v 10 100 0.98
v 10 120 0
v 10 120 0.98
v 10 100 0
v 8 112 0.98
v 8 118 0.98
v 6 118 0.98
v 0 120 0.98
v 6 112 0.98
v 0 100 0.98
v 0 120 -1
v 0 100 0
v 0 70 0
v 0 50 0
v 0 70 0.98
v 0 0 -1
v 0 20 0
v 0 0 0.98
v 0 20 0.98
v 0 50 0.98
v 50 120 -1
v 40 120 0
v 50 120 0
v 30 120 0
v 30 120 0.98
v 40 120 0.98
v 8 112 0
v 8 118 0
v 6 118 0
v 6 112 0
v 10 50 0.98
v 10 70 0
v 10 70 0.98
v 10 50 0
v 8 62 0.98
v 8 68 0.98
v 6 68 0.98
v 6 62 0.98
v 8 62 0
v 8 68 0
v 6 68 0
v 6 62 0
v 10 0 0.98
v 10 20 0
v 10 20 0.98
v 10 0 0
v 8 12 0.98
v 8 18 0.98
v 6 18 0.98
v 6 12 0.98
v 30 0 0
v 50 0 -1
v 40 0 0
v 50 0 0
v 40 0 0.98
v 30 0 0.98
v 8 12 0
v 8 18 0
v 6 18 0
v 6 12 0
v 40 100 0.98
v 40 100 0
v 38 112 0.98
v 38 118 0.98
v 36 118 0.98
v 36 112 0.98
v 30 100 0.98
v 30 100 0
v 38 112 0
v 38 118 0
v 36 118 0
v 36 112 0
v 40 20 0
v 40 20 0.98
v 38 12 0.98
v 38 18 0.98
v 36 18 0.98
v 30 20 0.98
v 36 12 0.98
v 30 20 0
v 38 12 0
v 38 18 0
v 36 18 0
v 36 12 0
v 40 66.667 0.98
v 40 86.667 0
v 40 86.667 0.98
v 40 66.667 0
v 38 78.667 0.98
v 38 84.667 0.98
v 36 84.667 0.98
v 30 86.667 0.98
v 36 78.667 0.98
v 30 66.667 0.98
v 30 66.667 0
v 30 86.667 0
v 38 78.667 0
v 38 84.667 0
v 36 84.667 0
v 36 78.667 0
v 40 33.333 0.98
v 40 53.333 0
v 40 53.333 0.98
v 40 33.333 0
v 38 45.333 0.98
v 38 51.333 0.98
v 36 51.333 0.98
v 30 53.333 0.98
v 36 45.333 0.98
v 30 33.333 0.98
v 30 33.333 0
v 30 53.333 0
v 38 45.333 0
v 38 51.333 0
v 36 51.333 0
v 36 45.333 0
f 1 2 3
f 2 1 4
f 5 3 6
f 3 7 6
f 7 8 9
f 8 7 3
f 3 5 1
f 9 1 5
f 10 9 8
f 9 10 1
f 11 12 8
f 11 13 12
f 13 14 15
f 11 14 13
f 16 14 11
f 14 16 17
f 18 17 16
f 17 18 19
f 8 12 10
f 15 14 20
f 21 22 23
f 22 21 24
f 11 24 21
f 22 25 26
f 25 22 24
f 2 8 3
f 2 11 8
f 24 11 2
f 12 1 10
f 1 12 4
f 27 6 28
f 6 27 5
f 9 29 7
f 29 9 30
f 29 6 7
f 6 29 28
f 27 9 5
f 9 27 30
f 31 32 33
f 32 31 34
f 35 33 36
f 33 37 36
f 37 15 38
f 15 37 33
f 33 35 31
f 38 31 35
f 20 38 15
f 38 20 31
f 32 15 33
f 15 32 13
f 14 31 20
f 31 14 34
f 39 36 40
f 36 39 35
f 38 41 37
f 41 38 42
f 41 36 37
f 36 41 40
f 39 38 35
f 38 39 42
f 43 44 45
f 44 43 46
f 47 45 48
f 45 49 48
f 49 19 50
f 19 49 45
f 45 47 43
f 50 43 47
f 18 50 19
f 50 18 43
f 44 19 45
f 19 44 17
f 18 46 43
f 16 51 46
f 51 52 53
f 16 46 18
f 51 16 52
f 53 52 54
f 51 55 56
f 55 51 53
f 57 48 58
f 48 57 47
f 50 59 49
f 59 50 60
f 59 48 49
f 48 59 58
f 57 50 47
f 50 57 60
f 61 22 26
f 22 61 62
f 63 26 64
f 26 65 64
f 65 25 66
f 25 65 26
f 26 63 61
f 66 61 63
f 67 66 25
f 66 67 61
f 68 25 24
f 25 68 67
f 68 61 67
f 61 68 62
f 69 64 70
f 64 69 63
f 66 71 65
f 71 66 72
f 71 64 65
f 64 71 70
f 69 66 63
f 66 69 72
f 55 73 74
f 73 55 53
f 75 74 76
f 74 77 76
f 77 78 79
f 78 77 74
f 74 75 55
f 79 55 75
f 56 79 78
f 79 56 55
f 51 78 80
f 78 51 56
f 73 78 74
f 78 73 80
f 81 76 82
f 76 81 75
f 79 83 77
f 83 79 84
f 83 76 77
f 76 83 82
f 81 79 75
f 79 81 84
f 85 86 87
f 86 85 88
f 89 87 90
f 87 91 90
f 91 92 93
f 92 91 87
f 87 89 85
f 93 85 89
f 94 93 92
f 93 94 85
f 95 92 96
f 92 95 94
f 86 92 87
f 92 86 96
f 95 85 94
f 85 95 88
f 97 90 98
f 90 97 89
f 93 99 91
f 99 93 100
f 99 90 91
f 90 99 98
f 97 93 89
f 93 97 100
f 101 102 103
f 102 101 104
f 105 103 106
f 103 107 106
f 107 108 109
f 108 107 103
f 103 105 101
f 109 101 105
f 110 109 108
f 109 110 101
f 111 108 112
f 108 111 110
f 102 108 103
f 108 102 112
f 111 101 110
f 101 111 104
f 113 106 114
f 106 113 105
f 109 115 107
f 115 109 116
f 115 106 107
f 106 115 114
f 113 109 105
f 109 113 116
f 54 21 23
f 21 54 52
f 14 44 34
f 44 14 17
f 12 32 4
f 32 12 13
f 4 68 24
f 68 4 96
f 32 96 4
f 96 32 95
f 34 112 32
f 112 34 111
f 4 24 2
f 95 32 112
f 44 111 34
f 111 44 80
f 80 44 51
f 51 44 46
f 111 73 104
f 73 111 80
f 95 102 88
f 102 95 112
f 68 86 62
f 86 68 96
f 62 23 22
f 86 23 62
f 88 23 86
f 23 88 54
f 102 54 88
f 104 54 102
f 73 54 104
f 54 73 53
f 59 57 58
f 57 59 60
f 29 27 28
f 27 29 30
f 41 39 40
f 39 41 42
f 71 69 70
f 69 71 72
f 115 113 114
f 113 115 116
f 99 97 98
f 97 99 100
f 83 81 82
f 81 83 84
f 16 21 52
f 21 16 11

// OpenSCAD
// file: ../../Base/Boxes.scad
// Fischertechnik Box Foundation
// Pre-designed Boxes

use <Constants.scad>

include <PlacementOptions.scad>

box190Width = 190;
box190Depth = 130;
box130Width = 130;
box130Depth = 95;
boxUsageHeight = 33.9;
boxWallThickness = 2.4;
boxBaseThickness = 1.0;

// getBoxWallThickness()
// Gets the wall thickness of a Fischertechnik Box

function getBoxWallThickness() = boxWallThickness;

// Gets the usable height of a fischertechnik box
function getBoxUsageHeight() = boxUsageHeight;

// Gets the thickness of the Fischertechnik box base.
function getBoxBaseThickness() = boxBaseThickness;

// Gets the usable inner space of a Box 190 as an x/y-list
function getBox190Space() = [
    box190Width - 2*getBoxWallThickness(), 
    box190Depth - 2*getBoxWallThickness() ];

// Imports the Fischertechnik empty box 130x190 mm and places it at position 0,0
// 190x130 are the outer sizes, the inner space is slightly smaller. Use getBox190Space() to get the inner sizes.
// This module needs the STL file "Fischertechnik Box 130x190.stl" in the library path.
// The box is positioned that the usable inner space is at the 0,0,0 position. The

module Box190() {
    translate([-getBoxWallThickness(),-getBoxWallThickness(),-getBoxBaseThickness()])
        import("Fischertechnik Box 130x190.stl", convexity=3);
}

// Gets the usable inner space of a Box 130 as an x/y-list
function getBox130Space() = [
    box130Width - 2*getBoxWallThickness(), 
    box130Depth - 2*getBoxWallThickness() ];

// Imports the Fischertechnik empty box 95x130 mm and places it at position 0,0
// 190x130 are the outer sizes, the inner space is slightly smaller. Use getBox190Space() to get the inner sizes.
// This module needs the STL file "Fischertechnik Box 95x130.stl" in the library path.
// The box is positioned that the usable inner space is at the 0,0,0 position. The

module Box130() {
    translate([-getBoxWallThickness(),-getBoxWallThickness(),-getBoxBaseThickness()])
        import("Fischertechnik Box 95x130.stl", convexity=3);
}

// Creates a web at the specified box walls
// corner 0 = LowerLeft, 1 = UpperLeft, 2 = UpperRight, 3 = LowerRight
// side 0 = LeftOfCorner, 1 = RightOfCorner
// distance = Distance in mm from the corner
// box = inner width and depth of the box (default: Box 190)
// webWidth = length of the web (default is 3 mms)
// webThickness = thickness of the web (default is 1 mm)

module BoxWeb(corner, side, distance, box=getBox190Space(), webWidth=3, webThickness=1.0) {
    sink = getBoxWallThickness()/2;

    width = (corner % 2 == 0) ? 
            (side == LeftOfCorner ? webWidth : webThickness) :
            (side == LeftOfCorner ? webThickness : webWidth);

    depth = (corner % 2 == 0) ? 
            (side == RightOfCorner ? webWidth : webThickness) :
            (side == RightOfCorner ? webThickness : webWidth);
    
    xDiff = corner == LowerLeft ? 
                (side == LeftOfCorner ? -sink : distance) :
            (corner == UpperLeft ?                
                (side == LeftOfCorner ? distance : -sink) :
            (corner == UpperRight ?
                (side == LeftOfCorner ? box.x-webWidth+sink : box.x-distance-webThickness) :
                (side == LeftOfCorner ? box.x-distance-webThickness: box.x-webWidth+sink)));

    yDiff = corner == LowerLeft ? 
                (side == RightOfCorner ? -sink : distance) :
            (corner == UpperLeft ?
                (side == RightOfCorner ? box.y-distance : box.y-webWidth+sink) :
            (corner == UpperRight ?
                (side == RightOfCorner ? box.y-webWidth+sink : box.y-distance) :
                (side == RightOfCorner ? distance : -sink)));
    
    translate([xDiff, yDiff, -getExcess()])
        cube([width, depth, boxUsageHeight + 2*getExcess()]);
}
// file: ../../Base/Alignment.scad
// Fischertechnik Box Foundation
// Geometry Helpers Alignment

include <PlacementOptions.scad>

// getAlignedX(elementWidth, spaceWidth, align=AlignRight, offset=0)
// Gets the aligned X offset of an element with the given
// width in the given space.
// elementWidth = The width of the element to positon
// spaceWidth = The space where the element should be aligned
// align = 0 AlignLeft, 1 AlignCenter, 2 AlignRight
// offset = an optional offset from the aligned position. When
// aligned left or centered, then positive values are in X direction.
// When aligned right then positive values are in negative X direction.

function getAlignedX(elementWidth, spaceWidth, align=AlignRight, offset=0) =
    (align == AlignLeft) ?
        offset :
        ((align == AlignCenter) ?
        (spaceWidth - elementWidth)/2 + offset :
        spaceWidth - offset - elementWidth);

// getAlignedY(elementDepth, spaceDepth, align=AlignTop, offset=0)
// Gets the aligned Y offset of an element with the given
// depth in the given space.
// elementDepth = The depth of the element to positon
// spaceDepth = The space where the element should be aligned
// align = 0 AlignBottom, 1 AlignCenter, 2 AlignTop
// offset = an optional offset from the aligned position. When
// aligned bottom or centered, then positive values are in Y direction.
// When aligned top then positive values are in negative Y direction.

function getAlignedY(elementDepth, spaceDepth, align=AlignTop, offset=0) =
    (align == AlignBottom) ?
        offset :
        ((align == AlignCenter) ?
        (spaceDepth - elementDepth)/2 + offset :
        spaceDepth - offset - elementDepth);
// file: ../../Base/Rotation.scad
// Fischertechnik Box Foundation
// Geometry Helpers Rotation

include <PlacementOptions.scad>

// getRotatedSpace(space, rotation=NoRotation)
// Rotates the space dependent on the specified rotation

function getRotatedSpace(space, rotation=NoRotation) = [
    (rotation == Rotate90 || rotation == Rotate270) ? space.y : space.x,
    (rotation == Rotate90 || rotation == Rotate270) ? space.x : space.y
];

// Rotates the given space around the fixed left lower corner
// space = the space the children needs as width/depth list [width,depth]
// rotation = 0 Rotate0 degrees, 1 Rotate90 degrees, 2 Rotate180 degrees, 3 Rotate270 degrees (equivalent to -90)

module RotateFix(space, rotation=Rotate0) {
    dy = (rotation == Rotate0 || rotation == Rotate270) ? 0 :
        (rotation == Rotate90) ? space.x :
        space.y;
    dx = (rotation < Rotate180) ? 0 :
        (rotation == Rotate180) ? space.x :
        space.y;
    
    translate([dx, dy, 0])
        rotate([0, 0, rotations[rotation]])
            children();
}
// file: ../../Base/Constants.scad
// Fischertechnik Box Foundation
// Constants

// Constant values necessary for multiple elements

// Base constants
dividerThickness = 1.2;
excess = 0.01;
fragments = 90;
tolerance = 0.8;

// Gets the thickness of a divider 
function getDividerThickness() = dividerThickness;

// Gets the excess that is used to merge walls into each other
function getExcess() = excess;

// Gets amount of fragments of a cylinder
function getFragments() = fragments;

// Gets the inner tolerance of a frame to each side
function getTolerance() = tolerance;


// Fischertechnik specific constants
axisDiameter = 4;
axisBottomDiameter = axisDiameter + 1;
standardEdgeDistance = 2.5;
standardWebDistance = 11.5;
standardCornerLength = 15;
tubeWallFactor = 1.6;

// Gets axis diameter
function getAxisDiameter() = axisDiameter;

// Gets axis bottom diameter for thicker part at the bottom
function getAxisBottomDiameter() = axisBottomDiameter;

// gets the standard distance to the wall of the box for dockable frames with webs
function getStandardEdgeDistance() = standardEdgeDistance;

// gets the standard distance of each web to the corner of the dockable frame
function getStandardWebDistance() = standardWebDistance;

// gets the standard length of the corner walls of a dockable frame
function getStandardCornerLength() = standardCornerLength;

// gets the wall thickness of a tube.
function getTubeWallThickness() = tubeWallFactor * getDividerThickness();
// file: ../TestHelper.scad
// Fischertechnik Box Foundation
// Test Helper

function getPlacementBaseSpace() = [50,60];
function getCubeSpace() = [10,20];

module PlacementBase() {
    color("green")
    translate([0, 0, -1])
        cube([getPlacementBaseSpace().x, getPlacementBaseSpace().y, 1]);
}

module Cube() {
    translate([0,0,-.01])
    difference() {
        cube([getCubeSpace().x,getCubeSpace().y,1]);
        translate([getCubeSpace().x*0.6, getCubeSpace().y*0.6, -1])
            cube([getCubeSpace().x*0.2,getCubeSpace().y*0.3,3]);
    }
}

module Deploy(distance=30) {
    for( i = [0:1:$children-1])
        translate([i*distance, 0])
            children(i);
}
// file: ../../Base/PlacementOptions.scad
// Fischertechnik Box Foundation
// Placement Options

// Alignment
NoAlign = 0;
AlignLeft = 1;
AlignBottom = 2;
AlignCenter = 3;
AlignRight = 4;
AlignTop = 5;

// Element rotation degree steps
rotations = [0, -90, -180, -270];

// Rotation
NoRotation = 0;
Rotate0 = 0;
Rotate90 = 1;
Rotate180 = 2;
Rotate270 = 3;

// Docking (seen from above)
NoDock = -1;
DockLeft = 0;
DockTop = 1;
DockRight = 2;
DockCorner = 2;
DockBottom = 3;

// Web corners
LowerLeft = 0;
UpperLeft = 1;
UpperRight = 2;
LowerRight = 3;

// Web position relative to corner
LeftOfCorner = 0;
RightOfCorner = 1;
// file: ../../Base/Placement.scad
// Fischertechnik Box Foundation
// Geometry Helpers Placement

use <Constants.scad>
use <Alignment.scad>
use <Rotation.scad>
use <Boxes.scad>

include <PlacementOptions.scad>

// Place(x=0, y=0, elementSpace=[0,0], alignX=AlignLeft, alignY=AlignBottom, rotation=Rotate0, boxSpace=getBox190Space())
// Places the child at the specified position
// y = Y-Position. This is a relative position when an X aligment is specified.
// x = X-Position. This is a relative position when an Y aligment is specified.
// elementSpace = space of the element to be placed [x,y]
// alignX = -1=NoAlign, 0 AlignLeft, 1 AlignCenter, 3 AlignRight (elementSpace and boxSpace required!)
// alignY = -1=NoAlign, 2 AlignBottom, 1 AlignCenter, 4 AlignTop (elementSpace and boxSpace required!)
// rotation = 0 Rotate0 0 degrees, 1 Rotate90 90 degrees, 
// 2 Rotate180 180 degrees, 3 Rotate270 270 degrees (equivalent to -90)
// boxSpace = Inner space of the box where the placement occurs [x,y] - default is Box 190x130 inner space

module Place(x=0, y=0, elementSpace=[0,0], 
  alignX=AlignLeft, alignY=AlignBottom, 
  rotation=NoRotation, boxSpace=getBox190Space()) {

    module Position(x, y, space, rotation=Rotate0) {
        translate([x, y, 0])
            RotateFix(space, rotation)
                children(0);
    }

    space = getRotatedSpace(elementSpace, rotation);
    alignedX = getAlignedX(space.x, boxSpace.x, alignX, x);
    alignedY = getAlignedY(space.y, boxSpace.y, alignY, y);
    Position(alignedX, alignedY, elementSpace, rotation)
        children(0);
}

// Center(space=getBox130Space(), elementSpace=[0,0])
// space = Space where the children is centered. For cylinder use centered=true and no elementSpace.
// elementSpace = space of the element to be centered [x,y]

module Center(space=getBox190Space(), elementSpace=[0,0]) {
    translate([(space.x - elementSpace.x) / 2, (space.y - elementSpace.y) / 2])
        children(0);
}

// CenterHorizontal(width=0, y=0, offset=0, space=getBox130Space())
// space = Space where the children is centered. For cylinder use centered=true and no elementSpace.
// elementSpace = space of the element to be centered [x,y]

module CenterHorizontal(width=0, y=0, offset=0, space=getBox190Space()) {
    translate([(space.x - width) / 2 + offset, y])
        children(0);
}

// CenterVertical(depth=0, x=0, offset=0, space=getBox130Space())
// space = Space where the children is centered. For cylinder use centered=true and no elementSpace.
// elementSpace = space of the element to be centered [x,y]

module CenterVerticalal(depth=0, x=0, offset=0, space=getBox190Space()) {
    translate([x, (space.y - depth) / 2 + offset])
        children(0);
}
// file: ../../Base/Deployment.scad
// Fischertechnik Box Foundation
// Geometry Helpers Deployment

use <Constants.scad>
use <Placement.scad>
use <Rotation.scad>

include <PlacementOptions.scad>

// getWidth(spaces, rotations, count, i=0)
// Gets the sum of the width of count specified spaces, including rotations for each space.
// spaces = List of spaces from which the width should be added. Used internally for DeployRow.
// rotations = specify rotations for each space to get its correct width
// count = The count of spaces from the specified spaces that should be included in the sum (for recursive call)
// i = The space index offset used to start to add (for recursive call)

function getWidth(spaces, rotations, count, i=0) = 
    (i < count) ? 
        getRotatedSpace(spaces[i], rotations[i]).x + getWidth(spaces, rotations, count, i+1) : 
        0;

// getX(spaces, rotations, distance, i)
// Calculates the X position of the space with the index i, when the spaces are placed with the given
// equal distances. Used internally for DeployRow.
// spaces = List of spaces from which the width should be added
// rotations = specify rotations for each space to get its correct width
// distance = Equal distance between each space
// i = Index of the space to get its X position for

function getX(spaces, rotations, distance, i) = 
    (i == 0) ? 
        0 :
        (getRotatedSpace(spaces[i-1], rotations[i-1]).x + distance + getX(spaces, rotations, distance, i-1));

// DeployHorizontal(width, spaces, rotations)
// Deploys the elements in the specified width with equal distances.
// rowWidth = The width of the row in mm.
// spaces = The spaces of all elements to deploy.
// rotations = The rotations of each element: 0 Rotate0 0 degrees, 1 Rotate90 90 degrees, 
// 2 Rotate180 180 degrees, 3 Rotate270 270 degrees (equivalent to -90).

module DeployHorizontal(rowWidth, spaces, rotations) {
    distance = (rowWidth - getWidth(spaces, rotations, len(spaces))) / (len(spaces)-1);
    
    for (i = [0:1:$children-1]) {
        x = getX(spaces, rotations, distance, i);
        translate([x, 0])
            RotateFix(spaces[i], rotations[i])
                children(i);
    }
}

// getDepth(spaces)
// Gets the sum of the depth of count specified spaces.
// spaces = List of spaces from which the width should be added. Used internally for DeployRow.
// rotations = specify rotations for each space to get its correct width
// count = The count of spaces from the specified spaces that should be included in the sum
// i = The space index offset used to start to add

function getDepthSum(spaces, i=0) = 
    (i < len(spaces)) ? 
        spaces[i].y + getDepthSum(spaces, i+1) : 
        0;

// getY(spaces, distance, i)
// Gets the Y-distance the spaces plus constant distance 
// between each space needs.
// spaces = Spaces of each element to deploy vertically. Only
// the depth (y) is used.
// distance = distance between each space when deployed.
// i = The highest index of the spaces used

function getY(spaces, distance, i) = 
    (i == 0) ? 
        0 :
        spaces[i].y + distance + getY(spaces, distance, i-1);

// DeployVertical(depth, spaces)
// Deploys the child elements in the specified depth vertically.
// depth = Depth of the space where the elements should be deployed.
// spaces = Spaces of all elements. Only the depth (y) will be used.

module DeployVertical(depth, spaces) {
    distance = (depth - getDepthSum(spaces)) / (len(spaces)-1);
    count = $children - 1;
    
    for (i = [0:1:$children-1]) {
        y = getY(spaces, distance, count-i);
        translate([0, y, -getExcess()])
            children(i);
    }
}

// DeploySame(space, elementSpace, columns=2, rows=1, rotation=Rotate0)
// Deploys columns and rows of the specified child in the specified space with
// equal distances
// space = The space where the element copies are deployed
// elementSpace = The space the child needs
// columns = Count of elements per row
// rows = Count of rows deployed
// rotation = The rotation of the child that will be applied

module DeploySame(space, elementSpace, columns=2, rows=1, rotation=Rotate0) {
    
    elementWidth = getRotatedSpace(elementSpace, rotation).x;
    columnDistance = (space.x - columns * elementWidth) / (columns > 1 ? columns - 1 : 1);
    endColumnOffset = space.x - elementWidth;
    columnOffsetStep = elementWidth + columnDistance;
    
    elementDepth = getRotatedSpace(elementSpace, rotation).y;
    rowDistance = (space.y - rows * elementDepth) / (rows > 1 ? rows - 1 : 1);
    endRowOffset = space.y - elementDepth;
    rowOffsetStep = elementDepth + rowDistance;
    
    for (rowOffset = [0:rowOffsetStep:endRowOffset]) {
        for (columnOffset = [0:columnOffsetStep:endColumnOffset]) {
            translate([columnOffset, rowOffset])
                RotateFix(elementSpace, rotation)
                    children(0);
        }
    }
}

// getMergedRowWidth(spaces, rotations, count, i=0)
// Gets the width of the merged spaces with the specified rotations.
// Merging works all elements with two frame walls. 
// The right and left walls are merged into one single wall.
// spaces = List of spaces from which the width should be added.
// rotations = specify rotations for each space to get its correct width
// count = The count of spaces from the specified spaces that should be included in the sum (for recursive call)
// i = The space index offset used to start to add (for recursive call)

function getMergedRowWidth(spaces, rotations, count, i=0) =
    (i < count) ? 
        getRotatedSpace(spaces[i], rotations[i]).x + getWidth(spaces, rotations, count, i+1) - (i > 0 ? getDividerThickness() : 0) : 
        0;

// MergeRow(spaces, rotations, dividerThickness=0.8)
// Deploys the children so that all walls of the neighbors are merged in a single common wall.
// spaces = List of spaces of the children to get the sizes from.
// rotations = specify rotations for each space to get its correct width
// dividerThickness = Thickness of all dividers of the elements (default is 0.8)

module MergeRow(spaces, rotations, dividerThickness = getDividerThickness()) {
    for (i = [0:1:$children-1]) {
        x = getX(spaces, rotations, -getDividerThickness(), i);
        translate([x, 0, 0])
            RotateFix(spaces[i], rotations[i])
                children(i);
    }
}

// Merge(count, space, rotation, dividerThickness=0.8)
// Deploys the child count times so that all walls of the neighbors are merged in a single common wall.
// space = Space of the child to get the sizes from.
// rotation = rotation of the child to get the correct width
// dividerThickness = Thickness of all dividers of the element (default is 0.8)

module Merge(count, space, rotation, dividerThickness = getDividerThickness()) {
    x = getRotatedSpace(space, rotation).x - getDividerThickness();
    for (offset = [0:x:(count-1)*x]) {
        echo(offset);
        translate([offset, 0, 0])
            RotateFix(space, rotation)
                children(0);
    }
}
// main file
// Fischertechnik Box Foundation
// Geometry Helpers Deployment
// Test DeployVertical

use <../../Base/Deployment.scad>
use <../../Base/Placement.scad>

include <../../Base/PlacementOptions.scad>

use <../TestHelper.scad>

PlacementBase();
translate([0, 60])
    PlacementBase();

DeployVertical(
    getPlacementBaseSpace().y*2, 
    [getCubeSpace(), getCubeSpace(), getCubeSpace()]) {
    Cube();
    Cube();
    Cube();
}

translate([30, 0, 0])
DeployVertical(
    getPlacementBaseSpace().y*2, 
    [getCubeSpace(), getCubeSpace(), getCubeSpace(), getCubeSpace()]) {
    Cube();
    Cube();
    Cube();
    Cube();
}
